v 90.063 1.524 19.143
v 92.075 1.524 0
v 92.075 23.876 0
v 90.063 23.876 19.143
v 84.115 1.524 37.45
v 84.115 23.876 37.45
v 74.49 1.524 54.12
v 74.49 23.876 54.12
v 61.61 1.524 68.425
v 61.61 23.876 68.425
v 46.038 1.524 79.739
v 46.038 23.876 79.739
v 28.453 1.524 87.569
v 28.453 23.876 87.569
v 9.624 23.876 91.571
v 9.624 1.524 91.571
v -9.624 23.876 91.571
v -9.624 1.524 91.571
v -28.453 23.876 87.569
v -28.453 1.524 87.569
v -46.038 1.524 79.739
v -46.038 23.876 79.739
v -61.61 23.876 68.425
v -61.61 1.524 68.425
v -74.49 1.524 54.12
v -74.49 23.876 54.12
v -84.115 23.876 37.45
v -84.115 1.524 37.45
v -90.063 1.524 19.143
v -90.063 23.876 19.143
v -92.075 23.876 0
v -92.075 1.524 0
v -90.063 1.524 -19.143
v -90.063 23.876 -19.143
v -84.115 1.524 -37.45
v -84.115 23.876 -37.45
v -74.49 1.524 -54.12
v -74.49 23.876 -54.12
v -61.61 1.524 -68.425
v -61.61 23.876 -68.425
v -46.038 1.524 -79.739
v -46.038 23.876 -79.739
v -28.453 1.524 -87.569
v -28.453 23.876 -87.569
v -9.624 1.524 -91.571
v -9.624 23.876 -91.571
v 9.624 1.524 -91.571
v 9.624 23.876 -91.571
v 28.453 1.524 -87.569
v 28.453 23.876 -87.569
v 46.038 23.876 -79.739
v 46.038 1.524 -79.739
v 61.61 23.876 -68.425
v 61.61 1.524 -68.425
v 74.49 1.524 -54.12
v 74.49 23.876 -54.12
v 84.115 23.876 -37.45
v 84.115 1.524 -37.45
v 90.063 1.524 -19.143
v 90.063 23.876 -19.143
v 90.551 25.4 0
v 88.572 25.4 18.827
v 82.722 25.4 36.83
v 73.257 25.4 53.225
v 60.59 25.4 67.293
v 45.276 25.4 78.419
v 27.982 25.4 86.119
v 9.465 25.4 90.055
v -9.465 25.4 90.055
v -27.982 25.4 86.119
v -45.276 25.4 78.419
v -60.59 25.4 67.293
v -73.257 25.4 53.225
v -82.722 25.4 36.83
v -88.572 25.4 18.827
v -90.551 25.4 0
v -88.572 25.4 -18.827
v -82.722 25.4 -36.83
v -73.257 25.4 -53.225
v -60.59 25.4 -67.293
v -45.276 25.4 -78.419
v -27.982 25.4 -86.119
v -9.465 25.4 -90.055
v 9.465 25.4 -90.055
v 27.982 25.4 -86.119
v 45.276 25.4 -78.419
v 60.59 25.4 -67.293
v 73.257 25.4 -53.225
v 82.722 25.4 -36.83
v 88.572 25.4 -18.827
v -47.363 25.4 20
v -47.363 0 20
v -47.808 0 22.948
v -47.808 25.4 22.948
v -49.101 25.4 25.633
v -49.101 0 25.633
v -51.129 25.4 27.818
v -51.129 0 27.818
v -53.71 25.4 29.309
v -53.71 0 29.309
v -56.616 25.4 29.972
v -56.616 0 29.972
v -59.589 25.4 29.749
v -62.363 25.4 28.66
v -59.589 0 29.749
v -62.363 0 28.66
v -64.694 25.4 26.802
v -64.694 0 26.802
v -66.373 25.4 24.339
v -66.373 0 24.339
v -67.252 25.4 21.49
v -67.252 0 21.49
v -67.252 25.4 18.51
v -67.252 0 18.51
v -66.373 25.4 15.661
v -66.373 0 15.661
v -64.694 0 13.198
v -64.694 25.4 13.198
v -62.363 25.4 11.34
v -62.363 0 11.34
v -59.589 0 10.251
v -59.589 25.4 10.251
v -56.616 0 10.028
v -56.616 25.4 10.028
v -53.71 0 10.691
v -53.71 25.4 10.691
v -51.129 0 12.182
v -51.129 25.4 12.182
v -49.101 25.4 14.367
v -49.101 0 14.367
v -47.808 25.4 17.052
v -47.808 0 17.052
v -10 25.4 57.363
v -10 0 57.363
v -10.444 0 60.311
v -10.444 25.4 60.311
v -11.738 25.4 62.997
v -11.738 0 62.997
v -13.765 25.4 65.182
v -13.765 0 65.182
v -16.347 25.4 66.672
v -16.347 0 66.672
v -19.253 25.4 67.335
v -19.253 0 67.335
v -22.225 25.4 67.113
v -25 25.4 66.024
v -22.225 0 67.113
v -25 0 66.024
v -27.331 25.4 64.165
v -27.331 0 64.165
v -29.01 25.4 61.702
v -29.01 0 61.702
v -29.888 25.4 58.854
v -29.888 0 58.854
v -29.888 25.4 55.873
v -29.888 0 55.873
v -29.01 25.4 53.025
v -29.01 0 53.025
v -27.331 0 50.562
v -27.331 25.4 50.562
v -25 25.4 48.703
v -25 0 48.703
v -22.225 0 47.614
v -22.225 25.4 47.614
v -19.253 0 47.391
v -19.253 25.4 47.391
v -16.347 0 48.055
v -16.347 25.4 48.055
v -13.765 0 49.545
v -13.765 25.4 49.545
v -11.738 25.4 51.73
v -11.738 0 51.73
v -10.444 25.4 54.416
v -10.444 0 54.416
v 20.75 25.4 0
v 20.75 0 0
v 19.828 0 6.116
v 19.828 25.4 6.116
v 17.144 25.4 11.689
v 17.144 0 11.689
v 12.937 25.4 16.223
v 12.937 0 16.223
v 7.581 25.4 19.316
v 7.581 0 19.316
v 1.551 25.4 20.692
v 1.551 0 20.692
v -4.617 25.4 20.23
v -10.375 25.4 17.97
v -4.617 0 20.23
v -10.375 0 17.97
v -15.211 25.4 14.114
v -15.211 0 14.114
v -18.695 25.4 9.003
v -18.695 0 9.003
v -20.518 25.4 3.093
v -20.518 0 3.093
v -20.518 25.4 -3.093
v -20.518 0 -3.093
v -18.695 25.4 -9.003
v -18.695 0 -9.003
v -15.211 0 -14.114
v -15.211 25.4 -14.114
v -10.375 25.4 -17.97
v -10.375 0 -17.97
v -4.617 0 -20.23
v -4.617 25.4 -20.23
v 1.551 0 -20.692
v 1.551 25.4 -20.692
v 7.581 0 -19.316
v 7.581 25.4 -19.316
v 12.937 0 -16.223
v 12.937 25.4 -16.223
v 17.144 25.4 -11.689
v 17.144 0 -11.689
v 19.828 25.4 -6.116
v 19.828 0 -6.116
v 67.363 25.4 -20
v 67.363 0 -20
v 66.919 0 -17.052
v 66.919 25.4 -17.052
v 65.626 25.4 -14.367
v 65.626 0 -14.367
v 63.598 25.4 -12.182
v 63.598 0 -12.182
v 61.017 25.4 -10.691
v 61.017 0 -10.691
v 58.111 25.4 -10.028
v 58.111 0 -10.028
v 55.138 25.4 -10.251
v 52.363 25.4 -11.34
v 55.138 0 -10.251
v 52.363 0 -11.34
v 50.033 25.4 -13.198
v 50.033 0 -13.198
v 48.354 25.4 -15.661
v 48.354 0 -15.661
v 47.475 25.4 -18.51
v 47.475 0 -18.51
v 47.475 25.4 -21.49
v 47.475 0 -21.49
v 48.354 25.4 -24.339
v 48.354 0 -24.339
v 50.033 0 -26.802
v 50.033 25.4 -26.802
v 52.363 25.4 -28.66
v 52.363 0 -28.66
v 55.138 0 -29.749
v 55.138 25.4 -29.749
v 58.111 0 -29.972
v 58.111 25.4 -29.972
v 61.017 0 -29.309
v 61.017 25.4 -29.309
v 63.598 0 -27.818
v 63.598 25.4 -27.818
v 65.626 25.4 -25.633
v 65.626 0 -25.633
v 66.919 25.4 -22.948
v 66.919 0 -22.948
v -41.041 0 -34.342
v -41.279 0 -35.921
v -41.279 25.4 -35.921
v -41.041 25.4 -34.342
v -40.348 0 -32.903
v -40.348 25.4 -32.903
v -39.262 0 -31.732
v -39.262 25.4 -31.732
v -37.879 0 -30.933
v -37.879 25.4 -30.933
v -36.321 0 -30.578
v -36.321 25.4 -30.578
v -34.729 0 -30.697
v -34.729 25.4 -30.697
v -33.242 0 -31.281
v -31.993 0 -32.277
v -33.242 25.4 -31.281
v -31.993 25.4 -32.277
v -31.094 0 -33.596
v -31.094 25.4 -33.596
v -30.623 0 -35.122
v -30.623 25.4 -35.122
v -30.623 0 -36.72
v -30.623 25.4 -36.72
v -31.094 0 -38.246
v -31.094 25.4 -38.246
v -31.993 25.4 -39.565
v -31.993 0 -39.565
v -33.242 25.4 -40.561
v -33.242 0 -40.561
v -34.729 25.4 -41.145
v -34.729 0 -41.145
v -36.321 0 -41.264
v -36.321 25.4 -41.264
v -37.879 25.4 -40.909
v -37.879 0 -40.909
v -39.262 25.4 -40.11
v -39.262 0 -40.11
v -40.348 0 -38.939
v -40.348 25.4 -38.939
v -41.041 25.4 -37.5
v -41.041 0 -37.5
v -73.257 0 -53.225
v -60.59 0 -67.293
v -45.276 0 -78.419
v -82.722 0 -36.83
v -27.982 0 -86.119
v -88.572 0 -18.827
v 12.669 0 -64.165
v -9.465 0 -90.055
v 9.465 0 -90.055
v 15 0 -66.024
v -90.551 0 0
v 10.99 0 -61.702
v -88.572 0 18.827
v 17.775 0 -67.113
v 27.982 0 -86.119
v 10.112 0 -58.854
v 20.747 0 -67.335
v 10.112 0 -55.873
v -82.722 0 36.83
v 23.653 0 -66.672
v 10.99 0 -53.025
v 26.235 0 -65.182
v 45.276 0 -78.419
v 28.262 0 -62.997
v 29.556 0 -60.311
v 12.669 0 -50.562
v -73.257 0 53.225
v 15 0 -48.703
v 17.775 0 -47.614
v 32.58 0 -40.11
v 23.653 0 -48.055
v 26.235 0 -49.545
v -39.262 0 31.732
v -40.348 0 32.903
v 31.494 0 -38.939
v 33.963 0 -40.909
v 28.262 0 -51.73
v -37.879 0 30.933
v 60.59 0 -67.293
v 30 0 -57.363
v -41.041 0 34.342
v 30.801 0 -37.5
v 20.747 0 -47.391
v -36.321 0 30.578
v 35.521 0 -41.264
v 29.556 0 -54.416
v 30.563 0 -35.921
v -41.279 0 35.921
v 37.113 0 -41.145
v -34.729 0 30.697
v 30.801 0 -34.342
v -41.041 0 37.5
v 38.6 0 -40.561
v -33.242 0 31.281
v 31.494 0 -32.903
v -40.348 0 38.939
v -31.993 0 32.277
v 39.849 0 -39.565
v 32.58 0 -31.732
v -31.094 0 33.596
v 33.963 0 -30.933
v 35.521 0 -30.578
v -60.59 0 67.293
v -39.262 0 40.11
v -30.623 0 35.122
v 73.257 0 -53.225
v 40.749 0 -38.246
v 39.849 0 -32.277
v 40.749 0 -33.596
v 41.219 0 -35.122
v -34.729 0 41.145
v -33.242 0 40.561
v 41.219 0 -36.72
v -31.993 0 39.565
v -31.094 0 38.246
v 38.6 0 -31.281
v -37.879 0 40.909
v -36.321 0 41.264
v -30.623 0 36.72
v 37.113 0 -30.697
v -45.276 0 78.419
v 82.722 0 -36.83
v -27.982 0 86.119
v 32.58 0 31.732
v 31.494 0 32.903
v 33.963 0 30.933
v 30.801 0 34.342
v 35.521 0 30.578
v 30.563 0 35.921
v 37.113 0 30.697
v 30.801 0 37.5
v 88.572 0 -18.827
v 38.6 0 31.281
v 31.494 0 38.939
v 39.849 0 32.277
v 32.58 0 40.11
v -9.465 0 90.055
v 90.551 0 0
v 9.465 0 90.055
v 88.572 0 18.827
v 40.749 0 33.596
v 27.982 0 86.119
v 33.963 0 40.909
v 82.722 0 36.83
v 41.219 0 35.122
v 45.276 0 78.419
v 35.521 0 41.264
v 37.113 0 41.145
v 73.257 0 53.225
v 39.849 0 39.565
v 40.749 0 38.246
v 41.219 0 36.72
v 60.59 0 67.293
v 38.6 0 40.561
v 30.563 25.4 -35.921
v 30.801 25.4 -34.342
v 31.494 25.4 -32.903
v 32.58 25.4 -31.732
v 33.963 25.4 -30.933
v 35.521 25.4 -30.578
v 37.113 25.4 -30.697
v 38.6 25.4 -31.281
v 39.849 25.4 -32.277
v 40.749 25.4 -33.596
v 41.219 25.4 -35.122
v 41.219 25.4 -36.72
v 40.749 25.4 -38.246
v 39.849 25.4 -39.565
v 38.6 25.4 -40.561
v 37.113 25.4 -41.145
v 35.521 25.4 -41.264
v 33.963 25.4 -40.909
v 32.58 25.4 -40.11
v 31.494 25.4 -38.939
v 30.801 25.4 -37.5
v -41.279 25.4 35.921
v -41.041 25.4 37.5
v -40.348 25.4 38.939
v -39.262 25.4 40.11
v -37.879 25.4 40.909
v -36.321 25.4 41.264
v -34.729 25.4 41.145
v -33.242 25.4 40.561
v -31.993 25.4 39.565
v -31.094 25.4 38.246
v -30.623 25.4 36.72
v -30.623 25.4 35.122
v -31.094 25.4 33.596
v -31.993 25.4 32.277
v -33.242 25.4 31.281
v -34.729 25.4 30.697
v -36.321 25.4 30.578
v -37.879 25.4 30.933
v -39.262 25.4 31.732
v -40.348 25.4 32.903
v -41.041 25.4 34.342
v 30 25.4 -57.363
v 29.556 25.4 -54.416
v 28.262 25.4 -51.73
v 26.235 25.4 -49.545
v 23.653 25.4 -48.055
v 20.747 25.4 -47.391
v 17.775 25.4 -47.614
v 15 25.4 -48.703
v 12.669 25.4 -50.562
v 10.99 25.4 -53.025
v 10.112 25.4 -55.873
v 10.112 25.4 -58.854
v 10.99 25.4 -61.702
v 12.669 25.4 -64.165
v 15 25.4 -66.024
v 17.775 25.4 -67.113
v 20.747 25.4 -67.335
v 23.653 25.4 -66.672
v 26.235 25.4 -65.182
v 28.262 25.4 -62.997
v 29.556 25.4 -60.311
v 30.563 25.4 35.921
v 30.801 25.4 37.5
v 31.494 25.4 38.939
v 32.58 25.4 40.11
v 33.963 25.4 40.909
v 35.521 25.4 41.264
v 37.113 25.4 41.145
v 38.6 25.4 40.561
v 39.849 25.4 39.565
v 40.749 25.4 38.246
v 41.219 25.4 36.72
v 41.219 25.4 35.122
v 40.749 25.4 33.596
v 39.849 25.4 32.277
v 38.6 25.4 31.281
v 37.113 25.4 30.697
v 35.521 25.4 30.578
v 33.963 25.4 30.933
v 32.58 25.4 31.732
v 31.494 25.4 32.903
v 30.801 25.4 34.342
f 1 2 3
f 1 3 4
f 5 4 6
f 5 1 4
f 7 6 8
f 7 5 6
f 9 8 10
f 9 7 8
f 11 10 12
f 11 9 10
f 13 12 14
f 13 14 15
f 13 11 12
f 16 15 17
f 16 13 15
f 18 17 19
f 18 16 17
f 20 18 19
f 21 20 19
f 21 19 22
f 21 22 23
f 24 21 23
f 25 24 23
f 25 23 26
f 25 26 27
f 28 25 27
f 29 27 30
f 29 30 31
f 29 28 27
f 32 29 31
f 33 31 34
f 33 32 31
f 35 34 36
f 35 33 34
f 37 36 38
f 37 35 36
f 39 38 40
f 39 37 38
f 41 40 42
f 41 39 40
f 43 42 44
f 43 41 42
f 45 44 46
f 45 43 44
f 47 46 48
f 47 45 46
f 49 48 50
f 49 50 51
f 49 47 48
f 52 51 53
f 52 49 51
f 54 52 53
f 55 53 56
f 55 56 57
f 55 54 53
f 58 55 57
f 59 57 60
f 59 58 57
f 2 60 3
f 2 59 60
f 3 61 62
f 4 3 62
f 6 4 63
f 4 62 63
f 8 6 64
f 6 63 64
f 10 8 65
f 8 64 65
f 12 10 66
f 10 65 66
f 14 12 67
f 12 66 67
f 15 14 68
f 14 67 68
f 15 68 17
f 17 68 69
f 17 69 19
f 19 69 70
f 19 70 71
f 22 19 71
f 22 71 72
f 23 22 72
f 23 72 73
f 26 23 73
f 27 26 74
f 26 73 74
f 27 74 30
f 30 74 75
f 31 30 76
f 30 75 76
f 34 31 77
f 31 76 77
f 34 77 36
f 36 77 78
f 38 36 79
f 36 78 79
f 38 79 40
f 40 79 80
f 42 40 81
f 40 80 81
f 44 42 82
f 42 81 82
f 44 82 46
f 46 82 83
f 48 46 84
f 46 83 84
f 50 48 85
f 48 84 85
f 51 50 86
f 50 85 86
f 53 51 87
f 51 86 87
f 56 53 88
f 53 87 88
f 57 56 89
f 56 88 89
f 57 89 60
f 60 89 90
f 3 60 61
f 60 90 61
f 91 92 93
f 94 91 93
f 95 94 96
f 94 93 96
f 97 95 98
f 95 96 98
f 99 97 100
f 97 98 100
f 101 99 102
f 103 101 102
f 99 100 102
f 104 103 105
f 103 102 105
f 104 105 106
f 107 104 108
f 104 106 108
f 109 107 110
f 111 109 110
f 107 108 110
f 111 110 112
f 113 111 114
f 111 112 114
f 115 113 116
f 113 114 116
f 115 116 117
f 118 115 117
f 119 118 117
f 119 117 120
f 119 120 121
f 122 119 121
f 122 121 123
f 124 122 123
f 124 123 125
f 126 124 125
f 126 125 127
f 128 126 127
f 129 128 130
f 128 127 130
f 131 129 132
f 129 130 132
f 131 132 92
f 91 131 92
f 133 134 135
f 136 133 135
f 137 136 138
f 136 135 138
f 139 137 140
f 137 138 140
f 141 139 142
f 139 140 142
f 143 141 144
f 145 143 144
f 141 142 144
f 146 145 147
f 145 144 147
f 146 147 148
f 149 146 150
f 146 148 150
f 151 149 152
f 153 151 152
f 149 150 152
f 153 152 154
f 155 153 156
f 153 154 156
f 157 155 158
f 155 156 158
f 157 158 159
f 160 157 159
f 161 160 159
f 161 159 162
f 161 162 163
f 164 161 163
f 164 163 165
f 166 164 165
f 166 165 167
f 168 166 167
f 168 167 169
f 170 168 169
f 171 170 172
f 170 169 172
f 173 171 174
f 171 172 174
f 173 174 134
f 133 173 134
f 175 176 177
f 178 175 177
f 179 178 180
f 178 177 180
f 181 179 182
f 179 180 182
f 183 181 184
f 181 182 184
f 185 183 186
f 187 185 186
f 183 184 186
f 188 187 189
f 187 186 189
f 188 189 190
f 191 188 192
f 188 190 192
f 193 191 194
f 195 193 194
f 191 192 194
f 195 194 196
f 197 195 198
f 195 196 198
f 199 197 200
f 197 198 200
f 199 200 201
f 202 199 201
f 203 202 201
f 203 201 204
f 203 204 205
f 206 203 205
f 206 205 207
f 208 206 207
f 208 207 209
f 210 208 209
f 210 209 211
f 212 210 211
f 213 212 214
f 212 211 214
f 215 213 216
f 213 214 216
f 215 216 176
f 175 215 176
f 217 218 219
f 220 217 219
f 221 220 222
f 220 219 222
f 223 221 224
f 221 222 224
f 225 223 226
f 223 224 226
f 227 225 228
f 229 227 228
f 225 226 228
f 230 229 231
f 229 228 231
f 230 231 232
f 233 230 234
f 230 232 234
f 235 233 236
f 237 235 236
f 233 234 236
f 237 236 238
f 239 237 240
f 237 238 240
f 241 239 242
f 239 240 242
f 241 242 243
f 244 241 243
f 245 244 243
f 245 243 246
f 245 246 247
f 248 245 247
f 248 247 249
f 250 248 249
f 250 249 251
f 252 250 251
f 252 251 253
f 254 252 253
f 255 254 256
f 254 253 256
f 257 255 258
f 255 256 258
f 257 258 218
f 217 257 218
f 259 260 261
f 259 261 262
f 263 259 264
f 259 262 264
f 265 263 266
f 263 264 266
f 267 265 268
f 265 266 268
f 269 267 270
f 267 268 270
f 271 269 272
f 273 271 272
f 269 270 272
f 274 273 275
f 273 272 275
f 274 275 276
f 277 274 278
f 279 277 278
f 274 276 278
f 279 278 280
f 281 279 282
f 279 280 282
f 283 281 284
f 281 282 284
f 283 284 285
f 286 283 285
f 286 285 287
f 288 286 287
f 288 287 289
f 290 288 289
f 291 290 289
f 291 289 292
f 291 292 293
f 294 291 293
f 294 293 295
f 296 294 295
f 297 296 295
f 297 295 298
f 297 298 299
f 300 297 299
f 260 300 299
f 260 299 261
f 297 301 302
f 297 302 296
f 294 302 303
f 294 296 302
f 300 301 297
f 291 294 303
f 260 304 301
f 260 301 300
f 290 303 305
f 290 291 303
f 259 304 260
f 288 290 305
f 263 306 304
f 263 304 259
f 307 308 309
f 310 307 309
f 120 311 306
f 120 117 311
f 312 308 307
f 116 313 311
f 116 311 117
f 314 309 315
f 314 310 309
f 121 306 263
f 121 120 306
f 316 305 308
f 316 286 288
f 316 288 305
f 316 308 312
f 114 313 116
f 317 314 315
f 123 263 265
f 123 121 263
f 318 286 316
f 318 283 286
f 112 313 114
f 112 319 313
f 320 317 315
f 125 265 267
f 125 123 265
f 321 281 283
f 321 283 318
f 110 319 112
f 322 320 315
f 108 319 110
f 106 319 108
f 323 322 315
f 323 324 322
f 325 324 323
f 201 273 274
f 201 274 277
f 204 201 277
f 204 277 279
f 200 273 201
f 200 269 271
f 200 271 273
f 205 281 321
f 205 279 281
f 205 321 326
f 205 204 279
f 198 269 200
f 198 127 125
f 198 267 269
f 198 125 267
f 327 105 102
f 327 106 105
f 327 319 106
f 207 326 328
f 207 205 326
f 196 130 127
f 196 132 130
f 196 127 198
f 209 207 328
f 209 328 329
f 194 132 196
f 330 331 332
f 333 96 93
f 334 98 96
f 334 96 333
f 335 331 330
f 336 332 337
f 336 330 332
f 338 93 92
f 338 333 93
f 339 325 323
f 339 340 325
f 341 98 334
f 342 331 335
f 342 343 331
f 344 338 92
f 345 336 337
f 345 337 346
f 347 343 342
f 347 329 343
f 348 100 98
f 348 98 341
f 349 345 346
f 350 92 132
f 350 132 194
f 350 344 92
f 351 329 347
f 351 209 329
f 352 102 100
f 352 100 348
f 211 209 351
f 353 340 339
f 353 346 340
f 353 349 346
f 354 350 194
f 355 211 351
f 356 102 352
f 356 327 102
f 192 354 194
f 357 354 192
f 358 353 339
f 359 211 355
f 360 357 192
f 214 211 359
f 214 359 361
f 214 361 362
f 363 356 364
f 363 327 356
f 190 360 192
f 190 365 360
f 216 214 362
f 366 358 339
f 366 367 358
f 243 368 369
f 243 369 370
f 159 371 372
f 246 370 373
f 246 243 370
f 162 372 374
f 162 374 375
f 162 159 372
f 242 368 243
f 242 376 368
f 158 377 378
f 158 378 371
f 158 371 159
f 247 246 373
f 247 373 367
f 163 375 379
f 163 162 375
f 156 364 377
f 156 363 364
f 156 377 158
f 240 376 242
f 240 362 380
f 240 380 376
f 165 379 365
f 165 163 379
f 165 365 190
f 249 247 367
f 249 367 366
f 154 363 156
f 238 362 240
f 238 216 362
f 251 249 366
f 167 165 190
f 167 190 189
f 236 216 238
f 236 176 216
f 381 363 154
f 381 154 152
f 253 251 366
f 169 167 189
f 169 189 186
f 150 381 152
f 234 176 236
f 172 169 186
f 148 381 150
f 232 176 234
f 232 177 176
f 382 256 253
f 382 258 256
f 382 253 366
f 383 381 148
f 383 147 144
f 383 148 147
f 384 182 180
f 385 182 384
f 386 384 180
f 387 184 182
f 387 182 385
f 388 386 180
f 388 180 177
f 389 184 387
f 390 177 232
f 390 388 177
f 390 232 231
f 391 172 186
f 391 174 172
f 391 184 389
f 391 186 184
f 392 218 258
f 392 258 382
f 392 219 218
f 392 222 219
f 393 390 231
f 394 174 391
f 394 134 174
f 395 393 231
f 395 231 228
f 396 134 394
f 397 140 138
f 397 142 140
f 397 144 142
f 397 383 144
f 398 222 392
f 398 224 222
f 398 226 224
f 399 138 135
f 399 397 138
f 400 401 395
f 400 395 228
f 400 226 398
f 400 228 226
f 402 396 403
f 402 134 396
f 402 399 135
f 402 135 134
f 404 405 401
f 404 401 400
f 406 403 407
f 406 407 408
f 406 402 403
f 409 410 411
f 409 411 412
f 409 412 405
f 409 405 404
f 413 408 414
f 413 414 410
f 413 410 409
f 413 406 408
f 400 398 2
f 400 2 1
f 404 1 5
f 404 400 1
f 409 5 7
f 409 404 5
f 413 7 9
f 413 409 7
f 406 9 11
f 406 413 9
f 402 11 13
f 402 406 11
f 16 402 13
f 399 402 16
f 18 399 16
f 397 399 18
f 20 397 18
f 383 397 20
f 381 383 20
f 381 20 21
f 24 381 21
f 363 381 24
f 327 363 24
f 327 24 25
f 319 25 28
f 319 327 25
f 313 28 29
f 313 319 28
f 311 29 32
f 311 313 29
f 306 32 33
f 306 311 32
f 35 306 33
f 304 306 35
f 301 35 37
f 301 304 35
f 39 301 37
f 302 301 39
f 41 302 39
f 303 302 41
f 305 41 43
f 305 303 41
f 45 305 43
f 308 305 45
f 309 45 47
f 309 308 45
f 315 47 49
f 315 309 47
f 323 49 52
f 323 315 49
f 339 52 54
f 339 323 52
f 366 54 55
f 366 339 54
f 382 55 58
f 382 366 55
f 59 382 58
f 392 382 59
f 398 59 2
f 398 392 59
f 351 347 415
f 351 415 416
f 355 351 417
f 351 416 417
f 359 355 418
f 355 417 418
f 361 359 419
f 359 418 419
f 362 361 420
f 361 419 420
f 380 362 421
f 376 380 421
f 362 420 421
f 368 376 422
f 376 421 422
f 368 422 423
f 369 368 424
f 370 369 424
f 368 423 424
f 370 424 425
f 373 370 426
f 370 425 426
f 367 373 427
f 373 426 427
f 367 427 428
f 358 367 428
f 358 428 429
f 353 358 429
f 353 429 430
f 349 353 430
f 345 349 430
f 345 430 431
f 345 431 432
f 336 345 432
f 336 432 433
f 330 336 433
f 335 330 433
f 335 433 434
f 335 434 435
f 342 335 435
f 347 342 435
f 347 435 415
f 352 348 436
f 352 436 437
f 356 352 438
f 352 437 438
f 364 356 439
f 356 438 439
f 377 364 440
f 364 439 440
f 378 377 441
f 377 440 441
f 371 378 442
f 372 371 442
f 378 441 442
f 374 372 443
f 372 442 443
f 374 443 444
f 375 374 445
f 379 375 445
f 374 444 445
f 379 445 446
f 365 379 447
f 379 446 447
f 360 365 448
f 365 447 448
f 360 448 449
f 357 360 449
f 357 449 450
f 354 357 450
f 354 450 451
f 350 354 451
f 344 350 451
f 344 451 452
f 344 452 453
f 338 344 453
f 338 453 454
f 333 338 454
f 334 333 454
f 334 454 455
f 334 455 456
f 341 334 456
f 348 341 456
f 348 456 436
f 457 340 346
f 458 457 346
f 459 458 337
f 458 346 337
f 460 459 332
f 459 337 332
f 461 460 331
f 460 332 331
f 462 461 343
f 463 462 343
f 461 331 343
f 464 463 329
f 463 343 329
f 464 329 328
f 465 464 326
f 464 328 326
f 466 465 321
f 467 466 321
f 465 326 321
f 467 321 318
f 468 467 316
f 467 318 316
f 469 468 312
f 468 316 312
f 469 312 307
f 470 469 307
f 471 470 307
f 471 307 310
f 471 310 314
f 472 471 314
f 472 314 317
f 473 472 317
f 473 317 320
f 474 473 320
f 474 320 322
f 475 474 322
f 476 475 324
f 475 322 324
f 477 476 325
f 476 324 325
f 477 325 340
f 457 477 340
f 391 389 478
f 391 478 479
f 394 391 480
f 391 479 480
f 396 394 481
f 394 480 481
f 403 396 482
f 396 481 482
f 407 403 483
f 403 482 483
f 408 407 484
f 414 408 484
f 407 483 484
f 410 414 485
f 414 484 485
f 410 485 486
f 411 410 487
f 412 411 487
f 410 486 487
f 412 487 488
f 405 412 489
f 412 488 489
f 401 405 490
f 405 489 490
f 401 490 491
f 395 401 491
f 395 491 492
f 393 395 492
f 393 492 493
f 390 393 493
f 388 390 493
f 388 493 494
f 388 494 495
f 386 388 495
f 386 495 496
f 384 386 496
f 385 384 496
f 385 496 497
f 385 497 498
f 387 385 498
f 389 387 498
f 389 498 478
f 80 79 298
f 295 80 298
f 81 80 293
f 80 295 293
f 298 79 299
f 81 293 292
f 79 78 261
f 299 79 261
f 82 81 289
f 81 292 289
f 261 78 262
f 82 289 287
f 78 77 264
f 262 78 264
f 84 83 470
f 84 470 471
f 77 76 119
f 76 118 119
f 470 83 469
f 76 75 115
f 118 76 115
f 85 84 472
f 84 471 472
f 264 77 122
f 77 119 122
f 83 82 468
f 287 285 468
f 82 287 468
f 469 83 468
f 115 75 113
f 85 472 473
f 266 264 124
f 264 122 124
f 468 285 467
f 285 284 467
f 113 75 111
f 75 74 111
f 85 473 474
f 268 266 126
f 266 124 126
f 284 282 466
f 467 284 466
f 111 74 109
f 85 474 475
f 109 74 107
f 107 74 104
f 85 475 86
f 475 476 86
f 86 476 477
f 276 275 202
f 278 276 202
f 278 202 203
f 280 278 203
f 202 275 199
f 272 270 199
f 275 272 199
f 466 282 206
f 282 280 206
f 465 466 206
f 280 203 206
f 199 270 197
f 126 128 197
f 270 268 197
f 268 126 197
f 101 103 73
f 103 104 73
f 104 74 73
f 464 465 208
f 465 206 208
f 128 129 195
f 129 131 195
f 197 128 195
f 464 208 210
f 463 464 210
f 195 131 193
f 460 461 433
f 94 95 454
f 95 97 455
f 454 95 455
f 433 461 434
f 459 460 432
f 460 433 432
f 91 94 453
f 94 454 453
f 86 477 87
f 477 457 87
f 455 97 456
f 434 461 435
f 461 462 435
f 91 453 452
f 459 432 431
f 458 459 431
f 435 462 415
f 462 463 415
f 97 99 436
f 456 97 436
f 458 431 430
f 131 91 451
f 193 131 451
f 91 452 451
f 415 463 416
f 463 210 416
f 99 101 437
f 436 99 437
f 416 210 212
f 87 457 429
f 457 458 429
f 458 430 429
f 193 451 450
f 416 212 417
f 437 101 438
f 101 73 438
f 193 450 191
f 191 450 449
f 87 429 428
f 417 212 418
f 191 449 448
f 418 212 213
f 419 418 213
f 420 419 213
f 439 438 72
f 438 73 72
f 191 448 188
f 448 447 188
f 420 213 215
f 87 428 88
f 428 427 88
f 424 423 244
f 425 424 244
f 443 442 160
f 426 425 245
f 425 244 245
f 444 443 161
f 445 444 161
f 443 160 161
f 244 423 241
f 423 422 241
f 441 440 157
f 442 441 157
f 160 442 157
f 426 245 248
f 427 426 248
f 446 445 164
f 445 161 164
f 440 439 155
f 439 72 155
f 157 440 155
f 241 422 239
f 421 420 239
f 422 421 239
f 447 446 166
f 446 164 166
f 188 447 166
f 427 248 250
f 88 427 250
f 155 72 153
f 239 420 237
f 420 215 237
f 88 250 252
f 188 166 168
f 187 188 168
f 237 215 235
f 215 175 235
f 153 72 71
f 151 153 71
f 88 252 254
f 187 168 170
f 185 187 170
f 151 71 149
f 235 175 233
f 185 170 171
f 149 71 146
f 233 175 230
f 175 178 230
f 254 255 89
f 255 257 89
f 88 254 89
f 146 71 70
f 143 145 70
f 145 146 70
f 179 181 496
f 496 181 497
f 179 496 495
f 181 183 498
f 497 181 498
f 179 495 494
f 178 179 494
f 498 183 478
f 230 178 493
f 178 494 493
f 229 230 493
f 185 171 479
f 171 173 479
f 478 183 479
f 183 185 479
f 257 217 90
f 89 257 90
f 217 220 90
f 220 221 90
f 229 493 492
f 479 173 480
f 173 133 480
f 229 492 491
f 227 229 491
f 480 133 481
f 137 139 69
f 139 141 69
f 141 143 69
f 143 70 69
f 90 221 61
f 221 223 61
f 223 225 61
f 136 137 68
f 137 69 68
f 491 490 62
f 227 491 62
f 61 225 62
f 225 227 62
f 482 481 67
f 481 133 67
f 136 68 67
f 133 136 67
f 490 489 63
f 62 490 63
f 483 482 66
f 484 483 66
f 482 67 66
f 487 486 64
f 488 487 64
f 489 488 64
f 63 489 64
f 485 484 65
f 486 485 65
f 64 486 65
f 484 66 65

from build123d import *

# Parameters (mm, degrees)
F0_R     = 92.075
F0_R_2   = 20.75
F1_DEPTH = 25.4
F2_R     = 10
F3_DEPTH = 25.4
F5_D     = 10.71626
F6_SIZE  = 1.524


with BuildPart() as f1:
    # F0 (on Front) → F1 (new body)
    with BuildSketch(Plane.XZ):
        Circle(F0_R)
        Circle(F0_R_2, mode=Mode.SUBTRACT)
    extrude(amount=-F1_DEPTH)

    # F2 (on face) → F3 (cut)
    with BuildSketch(Plane.XZ):
        with Locations((-57.3634247583, 20)):
            Circle(F2_R)
        with Locations((-20, 57.3634247583)):
            Circle(F2_R)
        with Locations((57.3634247583, -20)):
            Circle(F2_R)
        with Locations((20, -57.3634247583)):
            Circle(F2_R)
    extrude(amount=-F3_DEPTH, mode=Mode.SUBTRACT)

    # F5 (through all)
    with Locations(Plane.XZ):
        with Locations((-35.9210244843, 35.9210244843), (35.9210244843, 35.9210244843), (35.9210244843, -35.9210244843), (-35.9210244843, -35.9210244843)):
            Hole(F5_D / 2)

    # F6
    f6_edges = [f1.edges().sort_by_distance(p)[0] for p in [
        (92.075, 12.7, 0),
        (-92.075, 0, 0),
        (-92.075, 25.4, 0),
    ]]
    chamfer(f6_edges, length=F6_SIZE)


solid = f1.part
